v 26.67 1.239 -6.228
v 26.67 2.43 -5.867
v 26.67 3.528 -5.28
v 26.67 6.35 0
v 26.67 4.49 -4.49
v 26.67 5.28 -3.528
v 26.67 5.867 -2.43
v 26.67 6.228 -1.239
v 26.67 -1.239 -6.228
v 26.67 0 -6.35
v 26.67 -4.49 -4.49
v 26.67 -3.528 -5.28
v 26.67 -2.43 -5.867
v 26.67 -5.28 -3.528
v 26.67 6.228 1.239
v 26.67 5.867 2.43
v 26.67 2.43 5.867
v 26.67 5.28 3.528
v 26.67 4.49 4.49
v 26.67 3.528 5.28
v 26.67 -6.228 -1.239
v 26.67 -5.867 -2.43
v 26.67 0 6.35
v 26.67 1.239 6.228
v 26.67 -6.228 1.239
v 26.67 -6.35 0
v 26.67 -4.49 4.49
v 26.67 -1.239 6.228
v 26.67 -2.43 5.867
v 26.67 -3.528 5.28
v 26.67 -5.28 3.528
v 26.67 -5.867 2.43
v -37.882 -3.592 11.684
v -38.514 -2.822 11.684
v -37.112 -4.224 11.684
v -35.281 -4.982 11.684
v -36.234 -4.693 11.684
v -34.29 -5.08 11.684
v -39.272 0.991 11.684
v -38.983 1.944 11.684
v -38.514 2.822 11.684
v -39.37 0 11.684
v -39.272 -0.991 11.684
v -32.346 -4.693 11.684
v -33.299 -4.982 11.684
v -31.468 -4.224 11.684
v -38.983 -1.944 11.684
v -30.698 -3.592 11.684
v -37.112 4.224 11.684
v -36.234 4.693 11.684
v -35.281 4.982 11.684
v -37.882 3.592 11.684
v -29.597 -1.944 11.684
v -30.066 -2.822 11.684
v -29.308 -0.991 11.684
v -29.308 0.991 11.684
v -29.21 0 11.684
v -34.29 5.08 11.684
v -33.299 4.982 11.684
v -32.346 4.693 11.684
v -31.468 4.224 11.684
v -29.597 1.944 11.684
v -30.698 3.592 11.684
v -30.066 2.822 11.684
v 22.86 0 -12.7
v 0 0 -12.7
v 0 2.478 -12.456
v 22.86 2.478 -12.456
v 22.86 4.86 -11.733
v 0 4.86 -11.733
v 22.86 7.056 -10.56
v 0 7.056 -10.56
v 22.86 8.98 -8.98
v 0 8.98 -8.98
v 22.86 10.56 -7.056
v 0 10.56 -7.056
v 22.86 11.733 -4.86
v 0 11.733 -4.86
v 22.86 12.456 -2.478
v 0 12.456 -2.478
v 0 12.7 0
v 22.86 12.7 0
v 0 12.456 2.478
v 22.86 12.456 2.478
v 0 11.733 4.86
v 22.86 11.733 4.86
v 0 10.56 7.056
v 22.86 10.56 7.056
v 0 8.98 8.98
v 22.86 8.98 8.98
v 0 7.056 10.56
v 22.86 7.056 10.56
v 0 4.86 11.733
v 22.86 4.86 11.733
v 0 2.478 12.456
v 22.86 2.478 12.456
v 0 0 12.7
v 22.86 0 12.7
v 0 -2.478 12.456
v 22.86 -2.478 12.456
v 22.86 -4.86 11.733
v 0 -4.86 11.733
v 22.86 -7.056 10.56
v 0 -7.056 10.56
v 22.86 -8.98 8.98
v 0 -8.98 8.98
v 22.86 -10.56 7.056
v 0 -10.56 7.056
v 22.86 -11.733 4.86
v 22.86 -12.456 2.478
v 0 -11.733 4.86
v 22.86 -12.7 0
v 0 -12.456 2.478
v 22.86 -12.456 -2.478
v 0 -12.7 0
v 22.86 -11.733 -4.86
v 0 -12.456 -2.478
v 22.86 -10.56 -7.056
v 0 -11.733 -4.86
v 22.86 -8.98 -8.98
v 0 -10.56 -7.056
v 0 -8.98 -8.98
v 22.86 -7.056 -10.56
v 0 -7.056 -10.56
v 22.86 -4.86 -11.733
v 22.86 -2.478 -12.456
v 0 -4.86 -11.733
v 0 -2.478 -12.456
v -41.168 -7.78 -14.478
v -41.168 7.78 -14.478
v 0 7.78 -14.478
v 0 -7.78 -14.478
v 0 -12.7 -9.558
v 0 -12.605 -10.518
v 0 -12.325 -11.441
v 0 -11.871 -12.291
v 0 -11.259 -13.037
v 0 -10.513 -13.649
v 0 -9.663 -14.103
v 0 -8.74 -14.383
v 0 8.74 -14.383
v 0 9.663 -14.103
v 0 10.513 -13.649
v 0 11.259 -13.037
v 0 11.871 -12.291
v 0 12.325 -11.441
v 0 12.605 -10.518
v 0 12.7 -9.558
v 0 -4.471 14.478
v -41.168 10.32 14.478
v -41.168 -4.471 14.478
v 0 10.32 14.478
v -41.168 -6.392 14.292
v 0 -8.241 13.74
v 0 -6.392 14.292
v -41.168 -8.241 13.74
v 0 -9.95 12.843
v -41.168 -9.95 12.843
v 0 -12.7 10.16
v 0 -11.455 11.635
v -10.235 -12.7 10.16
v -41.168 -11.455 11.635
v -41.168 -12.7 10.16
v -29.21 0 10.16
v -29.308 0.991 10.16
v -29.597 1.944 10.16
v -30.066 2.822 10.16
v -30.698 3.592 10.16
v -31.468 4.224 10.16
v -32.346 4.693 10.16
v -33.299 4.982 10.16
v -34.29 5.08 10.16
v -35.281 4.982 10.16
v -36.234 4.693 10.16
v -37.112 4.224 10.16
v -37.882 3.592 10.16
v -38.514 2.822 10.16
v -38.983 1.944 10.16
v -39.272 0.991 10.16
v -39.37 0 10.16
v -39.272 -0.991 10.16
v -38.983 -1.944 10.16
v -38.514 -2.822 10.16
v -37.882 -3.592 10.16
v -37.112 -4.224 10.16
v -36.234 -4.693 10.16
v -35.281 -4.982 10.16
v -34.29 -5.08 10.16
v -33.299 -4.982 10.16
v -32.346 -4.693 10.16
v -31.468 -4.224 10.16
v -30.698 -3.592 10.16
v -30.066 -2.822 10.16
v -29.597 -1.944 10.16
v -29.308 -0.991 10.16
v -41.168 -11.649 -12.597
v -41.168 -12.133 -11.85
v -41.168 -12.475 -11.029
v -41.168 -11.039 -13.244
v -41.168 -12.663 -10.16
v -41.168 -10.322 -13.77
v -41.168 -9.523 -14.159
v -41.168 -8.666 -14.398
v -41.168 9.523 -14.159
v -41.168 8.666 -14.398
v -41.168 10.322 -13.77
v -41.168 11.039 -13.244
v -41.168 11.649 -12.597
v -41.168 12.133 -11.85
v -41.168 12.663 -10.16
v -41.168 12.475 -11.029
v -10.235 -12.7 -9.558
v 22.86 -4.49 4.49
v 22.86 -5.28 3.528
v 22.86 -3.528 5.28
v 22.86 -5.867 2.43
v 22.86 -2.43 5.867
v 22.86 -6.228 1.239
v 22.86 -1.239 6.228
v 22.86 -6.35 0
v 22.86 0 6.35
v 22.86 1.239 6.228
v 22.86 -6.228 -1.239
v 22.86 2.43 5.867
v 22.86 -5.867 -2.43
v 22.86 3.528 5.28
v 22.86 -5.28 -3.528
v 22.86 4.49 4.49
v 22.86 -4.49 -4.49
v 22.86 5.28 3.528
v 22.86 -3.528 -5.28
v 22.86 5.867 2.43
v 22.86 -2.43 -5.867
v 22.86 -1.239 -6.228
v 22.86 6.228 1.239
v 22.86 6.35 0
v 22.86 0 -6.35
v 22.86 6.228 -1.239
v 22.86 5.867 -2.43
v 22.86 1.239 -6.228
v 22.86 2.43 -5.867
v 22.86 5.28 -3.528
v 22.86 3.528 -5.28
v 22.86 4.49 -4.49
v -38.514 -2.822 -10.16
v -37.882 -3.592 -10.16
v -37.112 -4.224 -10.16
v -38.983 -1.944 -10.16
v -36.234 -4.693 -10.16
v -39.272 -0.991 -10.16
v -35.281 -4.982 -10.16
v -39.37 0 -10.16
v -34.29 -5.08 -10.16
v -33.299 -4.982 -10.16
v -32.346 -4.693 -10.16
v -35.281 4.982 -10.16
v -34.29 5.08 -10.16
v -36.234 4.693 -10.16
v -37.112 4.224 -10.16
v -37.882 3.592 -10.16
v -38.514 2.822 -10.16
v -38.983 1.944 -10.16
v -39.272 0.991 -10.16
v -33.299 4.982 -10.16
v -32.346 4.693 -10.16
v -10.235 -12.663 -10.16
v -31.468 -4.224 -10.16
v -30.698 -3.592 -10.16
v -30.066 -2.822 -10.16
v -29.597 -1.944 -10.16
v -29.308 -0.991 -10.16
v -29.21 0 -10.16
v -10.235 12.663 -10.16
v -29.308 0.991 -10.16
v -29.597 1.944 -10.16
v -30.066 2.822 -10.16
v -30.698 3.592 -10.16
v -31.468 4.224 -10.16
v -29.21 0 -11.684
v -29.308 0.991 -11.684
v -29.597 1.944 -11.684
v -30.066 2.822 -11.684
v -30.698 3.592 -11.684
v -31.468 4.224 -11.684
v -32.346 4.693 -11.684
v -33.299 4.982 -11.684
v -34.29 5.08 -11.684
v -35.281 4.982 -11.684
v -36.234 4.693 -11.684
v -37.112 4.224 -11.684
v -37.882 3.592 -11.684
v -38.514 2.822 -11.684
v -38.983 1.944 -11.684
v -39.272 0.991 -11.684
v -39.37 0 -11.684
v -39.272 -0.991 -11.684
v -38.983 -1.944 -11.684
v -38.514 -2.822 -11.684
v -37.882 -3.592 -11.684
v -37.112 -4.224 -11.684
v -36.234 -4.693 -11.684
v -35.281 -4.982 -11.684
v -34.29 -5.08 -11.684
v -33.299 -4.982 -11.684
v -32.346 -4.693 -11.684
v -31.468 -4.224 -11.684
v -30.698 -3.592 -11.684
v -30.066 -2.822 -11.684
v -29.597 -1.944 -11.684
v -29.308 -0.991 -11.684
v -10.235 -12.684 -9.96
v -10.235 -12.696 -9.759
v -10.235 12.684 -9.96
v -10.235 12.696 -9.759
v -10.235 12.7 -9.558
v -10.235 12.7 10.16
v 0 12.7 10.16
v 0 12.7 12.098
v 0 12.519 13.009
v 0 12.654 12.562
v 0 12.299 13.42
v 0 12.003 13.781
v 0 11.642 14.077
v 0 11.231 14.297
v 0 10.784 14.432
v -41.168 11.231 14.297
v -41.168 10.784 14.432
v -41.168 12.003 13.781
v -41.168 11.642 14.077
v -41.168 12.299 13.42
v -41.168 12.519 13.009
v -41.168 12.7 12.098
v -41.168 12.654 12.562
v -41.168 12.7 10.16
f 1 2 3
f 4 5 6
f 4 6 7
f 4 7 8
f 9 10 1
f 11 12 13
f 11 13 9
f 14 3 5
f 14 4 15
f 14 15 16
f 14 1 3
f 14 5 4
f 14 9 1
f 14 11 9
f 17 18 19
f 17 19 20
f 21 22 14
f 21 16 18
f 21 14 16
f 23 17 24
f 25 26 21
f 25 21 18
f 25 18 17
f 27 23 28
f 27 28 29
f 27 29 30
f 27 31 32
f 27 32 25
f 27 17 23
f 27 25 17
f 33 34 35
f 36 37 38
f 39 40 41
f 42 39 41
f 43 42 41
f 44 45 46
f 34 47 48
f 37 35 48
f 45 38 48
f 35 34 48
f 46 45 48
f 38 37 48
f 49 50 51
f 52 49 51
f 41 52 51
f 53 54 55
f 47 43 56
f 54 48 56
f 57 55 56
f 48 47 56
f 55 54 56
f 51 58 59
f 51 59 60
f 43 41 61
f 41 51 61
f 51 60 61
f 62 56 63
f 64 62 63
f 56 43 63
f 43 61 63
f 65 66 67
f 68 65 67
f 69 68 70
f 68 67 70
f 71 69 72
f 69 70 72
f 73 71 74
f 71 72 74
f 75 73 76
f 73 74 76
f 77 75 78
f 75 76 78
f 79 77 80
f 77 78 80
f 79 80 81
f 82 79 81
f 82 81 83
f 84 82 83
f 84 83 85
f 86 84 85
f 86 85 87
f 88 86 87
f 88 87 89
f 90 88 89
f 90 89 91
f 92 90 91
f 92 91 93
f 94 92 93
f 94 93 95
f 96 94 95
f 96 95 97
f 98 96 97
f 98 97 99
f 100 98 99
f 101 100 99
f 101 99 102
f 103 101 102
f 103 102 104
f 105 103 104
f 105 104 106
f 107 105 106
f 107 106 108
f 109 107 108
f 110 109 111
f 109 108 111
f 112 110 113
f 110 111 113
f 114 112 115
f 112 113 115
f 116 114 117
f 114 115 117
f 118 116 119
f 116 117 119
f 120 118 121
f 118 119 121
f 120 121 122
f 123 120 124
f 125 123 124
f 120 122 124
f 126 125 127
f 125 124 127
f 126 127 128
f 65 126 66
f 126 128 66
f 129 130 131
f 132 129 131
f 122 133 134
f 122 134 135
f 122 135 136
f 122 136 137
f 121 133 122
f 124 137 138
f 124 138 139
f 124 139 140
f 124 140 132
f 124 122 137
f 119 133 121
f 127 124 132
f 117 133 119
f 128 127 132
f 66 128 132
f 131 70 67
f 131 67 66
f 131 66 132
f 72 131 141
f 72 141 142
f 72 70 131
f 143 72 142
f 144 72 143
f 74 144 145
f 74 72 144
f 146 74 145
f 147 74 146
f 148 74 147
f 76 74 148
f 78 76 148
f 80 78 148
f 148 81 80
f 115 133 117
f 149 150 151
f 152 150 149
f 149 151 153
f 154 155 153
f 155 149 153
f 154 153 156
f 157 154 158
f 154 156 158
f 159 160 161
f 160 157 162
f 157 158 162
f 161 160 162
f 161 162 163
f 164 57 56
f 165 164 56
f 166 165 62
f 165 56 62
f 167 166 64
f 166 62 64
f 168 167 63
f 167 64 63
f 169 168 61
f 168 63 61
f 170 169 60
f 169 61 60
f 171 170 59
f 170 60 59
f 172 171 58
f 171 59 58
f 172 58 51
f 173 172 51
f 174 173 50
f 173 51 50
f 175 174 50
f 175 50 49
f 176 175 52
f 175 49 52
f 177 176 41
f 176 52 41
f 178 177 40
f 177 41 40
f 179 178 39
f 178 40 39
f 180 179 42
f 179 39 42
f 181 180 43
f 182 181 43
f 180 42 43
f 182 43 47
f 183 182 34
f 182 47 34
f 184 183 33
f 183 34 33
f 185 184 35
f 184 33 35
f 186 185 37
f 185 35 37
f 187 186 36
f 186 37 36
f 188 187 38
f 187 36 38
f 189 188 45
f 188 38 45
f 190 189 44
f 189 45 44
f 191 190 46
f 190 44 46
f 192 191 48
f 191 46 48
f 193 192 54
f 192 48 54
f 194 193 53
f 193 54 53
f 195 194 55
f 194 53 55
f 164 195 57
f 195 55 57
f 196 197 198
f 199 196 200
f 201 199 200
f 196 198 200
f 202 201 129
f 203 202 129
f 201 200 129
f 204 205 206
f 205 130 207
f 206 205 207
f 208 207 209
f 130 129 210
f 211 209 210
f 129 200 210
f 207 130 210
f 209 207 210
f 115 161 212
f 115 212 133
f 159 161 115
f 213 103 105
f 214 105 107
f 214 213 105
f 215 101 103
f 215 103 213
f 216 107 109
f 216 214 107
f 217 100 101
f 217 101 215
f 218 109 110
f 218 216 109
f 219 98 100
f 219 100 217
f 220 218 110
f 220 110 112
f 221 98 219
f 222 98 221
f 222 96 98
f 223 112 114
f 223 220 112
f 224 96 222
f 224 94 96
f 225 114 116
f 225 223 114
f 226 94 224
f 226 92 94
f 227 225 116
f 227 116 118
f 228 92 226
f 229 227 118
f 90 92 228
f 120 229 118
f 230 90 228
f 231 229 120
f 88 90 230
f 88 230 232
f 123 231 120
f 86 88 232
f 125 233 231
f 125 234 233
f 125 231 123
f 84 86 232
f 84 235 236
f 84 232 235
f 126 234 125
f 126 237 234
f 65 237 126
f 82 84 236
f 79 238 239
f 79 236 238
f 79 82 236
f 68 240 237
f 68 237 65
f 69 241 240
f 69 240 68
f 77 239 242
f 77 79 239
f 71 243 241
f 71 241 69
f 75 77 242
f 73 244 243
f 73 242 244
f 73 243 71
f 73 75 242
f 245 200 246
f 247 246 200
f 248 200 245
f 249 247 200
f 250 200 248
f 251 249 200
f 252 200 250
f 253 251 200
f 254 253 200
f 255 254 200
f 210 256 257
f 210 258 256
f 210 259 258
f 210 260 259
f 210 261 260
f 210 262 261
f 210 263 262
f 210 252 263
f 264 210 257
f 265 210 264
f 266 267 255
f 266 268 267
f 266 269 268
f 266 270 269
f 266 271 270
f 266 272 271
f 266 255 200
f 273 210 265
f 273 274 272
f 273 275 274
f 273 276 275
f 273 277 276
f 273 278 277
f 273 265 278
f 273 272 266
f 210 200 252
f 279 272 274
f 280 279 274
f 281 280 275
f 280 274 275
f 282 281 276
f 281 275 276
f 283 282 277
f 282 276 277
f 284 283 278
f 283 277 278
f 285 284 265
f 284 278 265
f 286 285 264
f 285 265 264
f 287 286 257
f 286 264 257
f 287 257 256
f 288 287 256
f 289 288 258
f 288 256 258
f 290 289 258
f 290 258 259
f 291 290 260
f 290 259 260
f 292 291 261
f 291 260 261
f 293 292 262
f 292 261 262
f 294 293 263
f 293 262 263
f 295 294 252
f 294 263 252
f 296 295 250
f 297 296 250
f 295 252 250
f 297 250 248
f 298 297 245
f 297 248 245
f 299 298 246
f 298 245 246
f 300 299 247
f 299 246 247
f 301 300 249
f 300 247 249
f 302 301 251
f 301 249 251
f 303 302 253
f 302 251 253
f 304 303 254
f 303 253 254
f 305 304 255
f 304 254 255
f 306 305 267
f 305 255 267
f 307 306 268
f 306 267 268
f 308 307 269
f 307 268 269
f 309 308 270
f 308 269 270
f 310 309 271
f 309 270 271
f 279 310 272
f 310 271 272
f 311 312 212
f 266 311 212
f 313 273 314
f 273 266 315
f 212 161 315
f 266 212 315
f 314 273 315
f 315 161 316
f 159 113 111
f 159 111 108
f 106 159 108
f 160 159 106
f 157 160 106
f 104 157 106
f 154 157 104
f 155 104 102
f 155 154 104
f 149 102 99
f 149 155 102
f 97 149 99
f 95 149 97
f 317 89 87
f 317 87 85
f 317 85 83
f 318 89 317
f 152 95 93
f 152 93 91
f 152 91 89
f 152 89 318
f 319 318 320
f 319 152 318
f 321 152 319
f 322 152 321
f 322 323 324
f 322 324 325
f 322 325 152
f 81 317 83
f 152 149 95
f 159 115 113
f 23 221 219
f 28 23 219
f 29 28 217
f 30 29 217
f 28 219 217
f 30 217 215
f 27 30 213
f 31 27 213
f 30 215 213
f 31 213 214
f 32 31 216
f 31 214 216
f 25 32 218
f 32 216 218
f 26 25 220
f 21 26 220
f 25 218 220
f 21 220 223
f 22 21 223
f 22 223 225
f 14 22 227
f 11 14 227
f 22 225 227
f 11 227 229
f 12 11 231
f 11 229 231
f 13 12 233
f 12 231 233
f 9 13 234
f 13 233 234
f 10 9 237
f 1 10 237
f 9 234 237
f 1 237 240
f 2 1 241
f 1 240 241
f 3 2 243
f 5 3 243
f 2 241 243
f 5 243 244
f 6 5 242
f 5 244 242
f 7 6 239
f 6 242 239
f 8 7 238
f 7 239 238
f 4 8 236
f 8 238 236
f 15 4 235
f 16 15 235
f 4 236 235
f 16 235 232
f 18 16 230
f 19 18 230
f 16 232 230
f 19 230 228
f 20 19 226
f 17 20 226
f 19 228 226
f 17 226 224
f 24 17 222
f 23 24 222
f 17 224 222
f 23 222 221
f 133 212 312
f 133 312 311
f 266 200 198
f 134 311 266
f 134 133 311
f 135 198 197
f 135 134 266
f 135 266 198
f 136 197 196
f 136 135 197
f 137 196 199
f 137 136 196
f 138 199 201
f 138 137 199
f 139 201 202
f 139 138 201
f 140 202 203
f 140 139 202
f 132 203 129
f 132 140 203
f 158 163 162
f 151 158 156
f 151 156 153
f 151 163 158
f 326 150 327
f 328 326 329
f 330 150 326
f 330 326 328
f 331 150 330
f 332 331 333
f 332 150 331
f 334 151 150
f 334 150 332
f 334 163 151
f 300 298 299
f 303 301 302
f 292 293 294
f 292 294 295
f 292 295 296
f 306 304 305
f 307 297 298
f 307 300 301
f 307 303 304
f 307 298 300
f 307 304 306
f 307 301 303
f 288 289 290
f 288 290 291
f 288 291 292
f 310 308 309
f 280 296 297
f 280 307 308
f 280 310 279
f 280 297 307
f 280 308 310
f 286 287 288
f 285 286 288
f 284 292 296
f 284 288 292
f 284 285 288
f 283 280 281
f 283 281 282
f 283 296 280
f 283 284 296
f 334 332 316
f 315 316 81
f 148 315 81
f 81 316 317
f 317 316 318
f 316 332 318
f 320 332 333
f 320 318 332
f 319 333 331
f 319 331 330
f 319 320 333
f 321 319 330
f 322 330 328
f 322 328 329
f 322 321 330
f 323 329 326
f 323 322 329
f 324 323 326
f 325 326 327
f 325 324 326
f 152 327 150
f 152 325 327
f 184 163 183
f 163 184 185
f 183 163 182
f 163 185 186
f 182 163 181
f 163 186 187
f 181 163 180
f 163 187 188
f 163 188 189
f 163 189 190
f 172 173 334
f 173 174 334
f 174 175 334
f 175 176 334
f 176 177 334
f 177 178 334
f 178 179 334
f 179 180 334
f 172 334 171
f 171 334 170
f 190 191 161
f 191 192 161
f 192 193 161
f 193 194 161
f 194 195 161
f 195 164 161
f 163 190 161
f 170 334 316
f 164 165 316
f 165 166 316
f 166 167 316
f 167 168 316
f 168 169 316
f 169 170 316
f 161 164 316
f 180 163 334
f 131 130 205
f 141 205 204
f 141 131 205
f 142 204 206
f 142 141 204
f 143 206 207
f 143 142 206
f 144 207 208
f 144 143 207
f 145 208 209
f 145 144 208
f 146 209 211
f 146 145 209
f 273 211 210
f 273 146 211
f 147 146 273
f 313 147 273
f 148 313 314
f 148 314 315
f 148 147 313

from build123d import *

# Parameters (mm, degrees)
SKETCH1_R            = 12.7
BOSS_EXTRUDE1_DEPTH  = 22.86
SKETCH2_R            = 6.35
BOSS_EXTRUDE2_DEPTH  = 3.81
SKETCH4_W            = 41.167859691
SKETCH4_H            = 25.4
BOSS_EXTRUDE4_DEPTH  = 4.318
FILLET3_R            = 2.380000066
FILLET4_R            = 10
SKETCH5_W            = 10.234607526
SKETCH5_H            = 25.4
BOSS_EXTRUDE5_DEPTH  = 20.32
SKETCH8_W            = 41.167859691
SKETCH8_H            = 25.4
BOSS_EXTRUDE10_DEPTH = 4.318
FILLET12_R           = 4.92
FILLET13_R           = 4.92
SKETCH9_R            = 5.08
CUT_EXTRUDE1_DEPTH   = 1.524
CUT_EXTRUDE3_START   = 1.524
SKETCH10_R           = 5.08
CUT_EXTRUDE3_DEPTH   = 1.524


with BuildPart() as part:
    # Sketch1 → Boss-Extrude1 (new body)
    with BuildSketch(Plane(origin=(0, 0, 0), x_dir=(0, 0, -1), z_dir=(1, 0, 0))):
        Circle(SKETCH1_R)
    extrude(amount=BOSS_EXTRUDE1_DEPTH)

    # Sketch2 → Boss-Extrude2 (add)
    with BuildSketch(Plane(origin=(22.86, 0, 0), x_dir=(0, 0, -1), z_dir=(1, 0, 0))):
        with Locations(Location((0, 0, 0), (0, 0, 180))):
            Circle(SKETCH2_R)
    extrude(amount=BOSS_EXTRUDE2_DEPTH)

    # Sketch4 → Boss-Extrude4 (add)
    with BuildSketch(Plane.XY.offset(10.16)):
        with Locations((-20.583929846, 0)):
            Rectangle(SKETCH4_W, SKETCH4_H)
    extrude(amount=BOSS_EXTRUDE4_DEPTH)

    # Fillet3
    fillet3_edges = [part.edges().sort_by_distance(p)[0] for p in [
        (-20.583929846, 12.7, 14.478),
    ]]
    fillet(fillet3_edges, radius=FILLET3_R)

    # Fillet4
    # the kernel refuses this fillet: 10 mm, written as the material it takes off along each edge
    with BuildSketch(Plane(origin=(-61.740121963, -12.7, 14.478), x_dir=(0, 1, 0), z_dir=(1, 0, 0))) as fillet4_piece_1:
        with BuildLine():
            CenterArc((8.228904909, -10), FILLET4_R, 90, 55.375198577)
            Line((0, -4.318), (-0.164578098, -4.20436))
            ThreePointArc((-0.164578098, -4.20436), (-0.2, -2.159), (-0.2, 0))
            Line((-0.2, 0), (0, 0.2))
            Line((0, 0.2), (8.228904909, 0.2))
            Line((8.228904909, 0.2), (8.228904909, 0))
        make_face()
    extrude(amount=82.312384236, mode=Mode.SUBTRACT)

    # Sketch5 → Boss-Extrude5 (add)
    with BuildSketch(Plane.XY.offset(10.16)):
        with Locations((-5.117303763, 0)):
            Rectangle(SKETCH5_W, SKETCH5_H)
    extrude(amount=-BOSS_EXTRUDE5_DEPTH)

    # Sketch8 → Boss-Extrude10 (add)
    with BuildSketch(Plane.XY.offset(-10.16)):
        with Locations((-20.583929846, 0)):
            Rectangle(SKETCH8_W, SKETCH8_H)
    extrude(amount=-BOSS_EXTRUDE10_DEPTH)

    # Fillet12
    fillet12_edges = [part.edges().sort_by_distance(p)[0] for p in [
        (-20.583929846, 12.7, -14.478),
    ]]
    fillet(fillet12_edges, radius=FILLET12_R)

    # Fillet13
    fillet13_edges = [part.edges().sort_by_distance(p)[0] for p in [
        (-20.583929846, -12.7, -14.478),
    ]]
    fillet(fillet13_edges, radius=FILLET13_R)

    # Sketch9 → Cut-Extrude1 (cut)
    with BuildSketch(Plane.XY.offset(-10.16)):
        with Locations((-34.29, 0)):
            Circle(SKETCH9_R)
    extrude(amount=-CUT_EXTRUDE1_DEPTH, mode=Mode.SUBTRACT)

    # Sketch10 → Cut-Extrude3 (cut)
    with BuildSketch(Plane.XY.offset(10.16).offset(CUT_EXTRUDE3_START)):
        with Locations((-34.29, 0)):
            Circle(SKETCH10_R)
    extrude(amount=-CUT_EXTRUDE3_DEPTH, mode=Mode.SUBTRACT)


solid = part.part
